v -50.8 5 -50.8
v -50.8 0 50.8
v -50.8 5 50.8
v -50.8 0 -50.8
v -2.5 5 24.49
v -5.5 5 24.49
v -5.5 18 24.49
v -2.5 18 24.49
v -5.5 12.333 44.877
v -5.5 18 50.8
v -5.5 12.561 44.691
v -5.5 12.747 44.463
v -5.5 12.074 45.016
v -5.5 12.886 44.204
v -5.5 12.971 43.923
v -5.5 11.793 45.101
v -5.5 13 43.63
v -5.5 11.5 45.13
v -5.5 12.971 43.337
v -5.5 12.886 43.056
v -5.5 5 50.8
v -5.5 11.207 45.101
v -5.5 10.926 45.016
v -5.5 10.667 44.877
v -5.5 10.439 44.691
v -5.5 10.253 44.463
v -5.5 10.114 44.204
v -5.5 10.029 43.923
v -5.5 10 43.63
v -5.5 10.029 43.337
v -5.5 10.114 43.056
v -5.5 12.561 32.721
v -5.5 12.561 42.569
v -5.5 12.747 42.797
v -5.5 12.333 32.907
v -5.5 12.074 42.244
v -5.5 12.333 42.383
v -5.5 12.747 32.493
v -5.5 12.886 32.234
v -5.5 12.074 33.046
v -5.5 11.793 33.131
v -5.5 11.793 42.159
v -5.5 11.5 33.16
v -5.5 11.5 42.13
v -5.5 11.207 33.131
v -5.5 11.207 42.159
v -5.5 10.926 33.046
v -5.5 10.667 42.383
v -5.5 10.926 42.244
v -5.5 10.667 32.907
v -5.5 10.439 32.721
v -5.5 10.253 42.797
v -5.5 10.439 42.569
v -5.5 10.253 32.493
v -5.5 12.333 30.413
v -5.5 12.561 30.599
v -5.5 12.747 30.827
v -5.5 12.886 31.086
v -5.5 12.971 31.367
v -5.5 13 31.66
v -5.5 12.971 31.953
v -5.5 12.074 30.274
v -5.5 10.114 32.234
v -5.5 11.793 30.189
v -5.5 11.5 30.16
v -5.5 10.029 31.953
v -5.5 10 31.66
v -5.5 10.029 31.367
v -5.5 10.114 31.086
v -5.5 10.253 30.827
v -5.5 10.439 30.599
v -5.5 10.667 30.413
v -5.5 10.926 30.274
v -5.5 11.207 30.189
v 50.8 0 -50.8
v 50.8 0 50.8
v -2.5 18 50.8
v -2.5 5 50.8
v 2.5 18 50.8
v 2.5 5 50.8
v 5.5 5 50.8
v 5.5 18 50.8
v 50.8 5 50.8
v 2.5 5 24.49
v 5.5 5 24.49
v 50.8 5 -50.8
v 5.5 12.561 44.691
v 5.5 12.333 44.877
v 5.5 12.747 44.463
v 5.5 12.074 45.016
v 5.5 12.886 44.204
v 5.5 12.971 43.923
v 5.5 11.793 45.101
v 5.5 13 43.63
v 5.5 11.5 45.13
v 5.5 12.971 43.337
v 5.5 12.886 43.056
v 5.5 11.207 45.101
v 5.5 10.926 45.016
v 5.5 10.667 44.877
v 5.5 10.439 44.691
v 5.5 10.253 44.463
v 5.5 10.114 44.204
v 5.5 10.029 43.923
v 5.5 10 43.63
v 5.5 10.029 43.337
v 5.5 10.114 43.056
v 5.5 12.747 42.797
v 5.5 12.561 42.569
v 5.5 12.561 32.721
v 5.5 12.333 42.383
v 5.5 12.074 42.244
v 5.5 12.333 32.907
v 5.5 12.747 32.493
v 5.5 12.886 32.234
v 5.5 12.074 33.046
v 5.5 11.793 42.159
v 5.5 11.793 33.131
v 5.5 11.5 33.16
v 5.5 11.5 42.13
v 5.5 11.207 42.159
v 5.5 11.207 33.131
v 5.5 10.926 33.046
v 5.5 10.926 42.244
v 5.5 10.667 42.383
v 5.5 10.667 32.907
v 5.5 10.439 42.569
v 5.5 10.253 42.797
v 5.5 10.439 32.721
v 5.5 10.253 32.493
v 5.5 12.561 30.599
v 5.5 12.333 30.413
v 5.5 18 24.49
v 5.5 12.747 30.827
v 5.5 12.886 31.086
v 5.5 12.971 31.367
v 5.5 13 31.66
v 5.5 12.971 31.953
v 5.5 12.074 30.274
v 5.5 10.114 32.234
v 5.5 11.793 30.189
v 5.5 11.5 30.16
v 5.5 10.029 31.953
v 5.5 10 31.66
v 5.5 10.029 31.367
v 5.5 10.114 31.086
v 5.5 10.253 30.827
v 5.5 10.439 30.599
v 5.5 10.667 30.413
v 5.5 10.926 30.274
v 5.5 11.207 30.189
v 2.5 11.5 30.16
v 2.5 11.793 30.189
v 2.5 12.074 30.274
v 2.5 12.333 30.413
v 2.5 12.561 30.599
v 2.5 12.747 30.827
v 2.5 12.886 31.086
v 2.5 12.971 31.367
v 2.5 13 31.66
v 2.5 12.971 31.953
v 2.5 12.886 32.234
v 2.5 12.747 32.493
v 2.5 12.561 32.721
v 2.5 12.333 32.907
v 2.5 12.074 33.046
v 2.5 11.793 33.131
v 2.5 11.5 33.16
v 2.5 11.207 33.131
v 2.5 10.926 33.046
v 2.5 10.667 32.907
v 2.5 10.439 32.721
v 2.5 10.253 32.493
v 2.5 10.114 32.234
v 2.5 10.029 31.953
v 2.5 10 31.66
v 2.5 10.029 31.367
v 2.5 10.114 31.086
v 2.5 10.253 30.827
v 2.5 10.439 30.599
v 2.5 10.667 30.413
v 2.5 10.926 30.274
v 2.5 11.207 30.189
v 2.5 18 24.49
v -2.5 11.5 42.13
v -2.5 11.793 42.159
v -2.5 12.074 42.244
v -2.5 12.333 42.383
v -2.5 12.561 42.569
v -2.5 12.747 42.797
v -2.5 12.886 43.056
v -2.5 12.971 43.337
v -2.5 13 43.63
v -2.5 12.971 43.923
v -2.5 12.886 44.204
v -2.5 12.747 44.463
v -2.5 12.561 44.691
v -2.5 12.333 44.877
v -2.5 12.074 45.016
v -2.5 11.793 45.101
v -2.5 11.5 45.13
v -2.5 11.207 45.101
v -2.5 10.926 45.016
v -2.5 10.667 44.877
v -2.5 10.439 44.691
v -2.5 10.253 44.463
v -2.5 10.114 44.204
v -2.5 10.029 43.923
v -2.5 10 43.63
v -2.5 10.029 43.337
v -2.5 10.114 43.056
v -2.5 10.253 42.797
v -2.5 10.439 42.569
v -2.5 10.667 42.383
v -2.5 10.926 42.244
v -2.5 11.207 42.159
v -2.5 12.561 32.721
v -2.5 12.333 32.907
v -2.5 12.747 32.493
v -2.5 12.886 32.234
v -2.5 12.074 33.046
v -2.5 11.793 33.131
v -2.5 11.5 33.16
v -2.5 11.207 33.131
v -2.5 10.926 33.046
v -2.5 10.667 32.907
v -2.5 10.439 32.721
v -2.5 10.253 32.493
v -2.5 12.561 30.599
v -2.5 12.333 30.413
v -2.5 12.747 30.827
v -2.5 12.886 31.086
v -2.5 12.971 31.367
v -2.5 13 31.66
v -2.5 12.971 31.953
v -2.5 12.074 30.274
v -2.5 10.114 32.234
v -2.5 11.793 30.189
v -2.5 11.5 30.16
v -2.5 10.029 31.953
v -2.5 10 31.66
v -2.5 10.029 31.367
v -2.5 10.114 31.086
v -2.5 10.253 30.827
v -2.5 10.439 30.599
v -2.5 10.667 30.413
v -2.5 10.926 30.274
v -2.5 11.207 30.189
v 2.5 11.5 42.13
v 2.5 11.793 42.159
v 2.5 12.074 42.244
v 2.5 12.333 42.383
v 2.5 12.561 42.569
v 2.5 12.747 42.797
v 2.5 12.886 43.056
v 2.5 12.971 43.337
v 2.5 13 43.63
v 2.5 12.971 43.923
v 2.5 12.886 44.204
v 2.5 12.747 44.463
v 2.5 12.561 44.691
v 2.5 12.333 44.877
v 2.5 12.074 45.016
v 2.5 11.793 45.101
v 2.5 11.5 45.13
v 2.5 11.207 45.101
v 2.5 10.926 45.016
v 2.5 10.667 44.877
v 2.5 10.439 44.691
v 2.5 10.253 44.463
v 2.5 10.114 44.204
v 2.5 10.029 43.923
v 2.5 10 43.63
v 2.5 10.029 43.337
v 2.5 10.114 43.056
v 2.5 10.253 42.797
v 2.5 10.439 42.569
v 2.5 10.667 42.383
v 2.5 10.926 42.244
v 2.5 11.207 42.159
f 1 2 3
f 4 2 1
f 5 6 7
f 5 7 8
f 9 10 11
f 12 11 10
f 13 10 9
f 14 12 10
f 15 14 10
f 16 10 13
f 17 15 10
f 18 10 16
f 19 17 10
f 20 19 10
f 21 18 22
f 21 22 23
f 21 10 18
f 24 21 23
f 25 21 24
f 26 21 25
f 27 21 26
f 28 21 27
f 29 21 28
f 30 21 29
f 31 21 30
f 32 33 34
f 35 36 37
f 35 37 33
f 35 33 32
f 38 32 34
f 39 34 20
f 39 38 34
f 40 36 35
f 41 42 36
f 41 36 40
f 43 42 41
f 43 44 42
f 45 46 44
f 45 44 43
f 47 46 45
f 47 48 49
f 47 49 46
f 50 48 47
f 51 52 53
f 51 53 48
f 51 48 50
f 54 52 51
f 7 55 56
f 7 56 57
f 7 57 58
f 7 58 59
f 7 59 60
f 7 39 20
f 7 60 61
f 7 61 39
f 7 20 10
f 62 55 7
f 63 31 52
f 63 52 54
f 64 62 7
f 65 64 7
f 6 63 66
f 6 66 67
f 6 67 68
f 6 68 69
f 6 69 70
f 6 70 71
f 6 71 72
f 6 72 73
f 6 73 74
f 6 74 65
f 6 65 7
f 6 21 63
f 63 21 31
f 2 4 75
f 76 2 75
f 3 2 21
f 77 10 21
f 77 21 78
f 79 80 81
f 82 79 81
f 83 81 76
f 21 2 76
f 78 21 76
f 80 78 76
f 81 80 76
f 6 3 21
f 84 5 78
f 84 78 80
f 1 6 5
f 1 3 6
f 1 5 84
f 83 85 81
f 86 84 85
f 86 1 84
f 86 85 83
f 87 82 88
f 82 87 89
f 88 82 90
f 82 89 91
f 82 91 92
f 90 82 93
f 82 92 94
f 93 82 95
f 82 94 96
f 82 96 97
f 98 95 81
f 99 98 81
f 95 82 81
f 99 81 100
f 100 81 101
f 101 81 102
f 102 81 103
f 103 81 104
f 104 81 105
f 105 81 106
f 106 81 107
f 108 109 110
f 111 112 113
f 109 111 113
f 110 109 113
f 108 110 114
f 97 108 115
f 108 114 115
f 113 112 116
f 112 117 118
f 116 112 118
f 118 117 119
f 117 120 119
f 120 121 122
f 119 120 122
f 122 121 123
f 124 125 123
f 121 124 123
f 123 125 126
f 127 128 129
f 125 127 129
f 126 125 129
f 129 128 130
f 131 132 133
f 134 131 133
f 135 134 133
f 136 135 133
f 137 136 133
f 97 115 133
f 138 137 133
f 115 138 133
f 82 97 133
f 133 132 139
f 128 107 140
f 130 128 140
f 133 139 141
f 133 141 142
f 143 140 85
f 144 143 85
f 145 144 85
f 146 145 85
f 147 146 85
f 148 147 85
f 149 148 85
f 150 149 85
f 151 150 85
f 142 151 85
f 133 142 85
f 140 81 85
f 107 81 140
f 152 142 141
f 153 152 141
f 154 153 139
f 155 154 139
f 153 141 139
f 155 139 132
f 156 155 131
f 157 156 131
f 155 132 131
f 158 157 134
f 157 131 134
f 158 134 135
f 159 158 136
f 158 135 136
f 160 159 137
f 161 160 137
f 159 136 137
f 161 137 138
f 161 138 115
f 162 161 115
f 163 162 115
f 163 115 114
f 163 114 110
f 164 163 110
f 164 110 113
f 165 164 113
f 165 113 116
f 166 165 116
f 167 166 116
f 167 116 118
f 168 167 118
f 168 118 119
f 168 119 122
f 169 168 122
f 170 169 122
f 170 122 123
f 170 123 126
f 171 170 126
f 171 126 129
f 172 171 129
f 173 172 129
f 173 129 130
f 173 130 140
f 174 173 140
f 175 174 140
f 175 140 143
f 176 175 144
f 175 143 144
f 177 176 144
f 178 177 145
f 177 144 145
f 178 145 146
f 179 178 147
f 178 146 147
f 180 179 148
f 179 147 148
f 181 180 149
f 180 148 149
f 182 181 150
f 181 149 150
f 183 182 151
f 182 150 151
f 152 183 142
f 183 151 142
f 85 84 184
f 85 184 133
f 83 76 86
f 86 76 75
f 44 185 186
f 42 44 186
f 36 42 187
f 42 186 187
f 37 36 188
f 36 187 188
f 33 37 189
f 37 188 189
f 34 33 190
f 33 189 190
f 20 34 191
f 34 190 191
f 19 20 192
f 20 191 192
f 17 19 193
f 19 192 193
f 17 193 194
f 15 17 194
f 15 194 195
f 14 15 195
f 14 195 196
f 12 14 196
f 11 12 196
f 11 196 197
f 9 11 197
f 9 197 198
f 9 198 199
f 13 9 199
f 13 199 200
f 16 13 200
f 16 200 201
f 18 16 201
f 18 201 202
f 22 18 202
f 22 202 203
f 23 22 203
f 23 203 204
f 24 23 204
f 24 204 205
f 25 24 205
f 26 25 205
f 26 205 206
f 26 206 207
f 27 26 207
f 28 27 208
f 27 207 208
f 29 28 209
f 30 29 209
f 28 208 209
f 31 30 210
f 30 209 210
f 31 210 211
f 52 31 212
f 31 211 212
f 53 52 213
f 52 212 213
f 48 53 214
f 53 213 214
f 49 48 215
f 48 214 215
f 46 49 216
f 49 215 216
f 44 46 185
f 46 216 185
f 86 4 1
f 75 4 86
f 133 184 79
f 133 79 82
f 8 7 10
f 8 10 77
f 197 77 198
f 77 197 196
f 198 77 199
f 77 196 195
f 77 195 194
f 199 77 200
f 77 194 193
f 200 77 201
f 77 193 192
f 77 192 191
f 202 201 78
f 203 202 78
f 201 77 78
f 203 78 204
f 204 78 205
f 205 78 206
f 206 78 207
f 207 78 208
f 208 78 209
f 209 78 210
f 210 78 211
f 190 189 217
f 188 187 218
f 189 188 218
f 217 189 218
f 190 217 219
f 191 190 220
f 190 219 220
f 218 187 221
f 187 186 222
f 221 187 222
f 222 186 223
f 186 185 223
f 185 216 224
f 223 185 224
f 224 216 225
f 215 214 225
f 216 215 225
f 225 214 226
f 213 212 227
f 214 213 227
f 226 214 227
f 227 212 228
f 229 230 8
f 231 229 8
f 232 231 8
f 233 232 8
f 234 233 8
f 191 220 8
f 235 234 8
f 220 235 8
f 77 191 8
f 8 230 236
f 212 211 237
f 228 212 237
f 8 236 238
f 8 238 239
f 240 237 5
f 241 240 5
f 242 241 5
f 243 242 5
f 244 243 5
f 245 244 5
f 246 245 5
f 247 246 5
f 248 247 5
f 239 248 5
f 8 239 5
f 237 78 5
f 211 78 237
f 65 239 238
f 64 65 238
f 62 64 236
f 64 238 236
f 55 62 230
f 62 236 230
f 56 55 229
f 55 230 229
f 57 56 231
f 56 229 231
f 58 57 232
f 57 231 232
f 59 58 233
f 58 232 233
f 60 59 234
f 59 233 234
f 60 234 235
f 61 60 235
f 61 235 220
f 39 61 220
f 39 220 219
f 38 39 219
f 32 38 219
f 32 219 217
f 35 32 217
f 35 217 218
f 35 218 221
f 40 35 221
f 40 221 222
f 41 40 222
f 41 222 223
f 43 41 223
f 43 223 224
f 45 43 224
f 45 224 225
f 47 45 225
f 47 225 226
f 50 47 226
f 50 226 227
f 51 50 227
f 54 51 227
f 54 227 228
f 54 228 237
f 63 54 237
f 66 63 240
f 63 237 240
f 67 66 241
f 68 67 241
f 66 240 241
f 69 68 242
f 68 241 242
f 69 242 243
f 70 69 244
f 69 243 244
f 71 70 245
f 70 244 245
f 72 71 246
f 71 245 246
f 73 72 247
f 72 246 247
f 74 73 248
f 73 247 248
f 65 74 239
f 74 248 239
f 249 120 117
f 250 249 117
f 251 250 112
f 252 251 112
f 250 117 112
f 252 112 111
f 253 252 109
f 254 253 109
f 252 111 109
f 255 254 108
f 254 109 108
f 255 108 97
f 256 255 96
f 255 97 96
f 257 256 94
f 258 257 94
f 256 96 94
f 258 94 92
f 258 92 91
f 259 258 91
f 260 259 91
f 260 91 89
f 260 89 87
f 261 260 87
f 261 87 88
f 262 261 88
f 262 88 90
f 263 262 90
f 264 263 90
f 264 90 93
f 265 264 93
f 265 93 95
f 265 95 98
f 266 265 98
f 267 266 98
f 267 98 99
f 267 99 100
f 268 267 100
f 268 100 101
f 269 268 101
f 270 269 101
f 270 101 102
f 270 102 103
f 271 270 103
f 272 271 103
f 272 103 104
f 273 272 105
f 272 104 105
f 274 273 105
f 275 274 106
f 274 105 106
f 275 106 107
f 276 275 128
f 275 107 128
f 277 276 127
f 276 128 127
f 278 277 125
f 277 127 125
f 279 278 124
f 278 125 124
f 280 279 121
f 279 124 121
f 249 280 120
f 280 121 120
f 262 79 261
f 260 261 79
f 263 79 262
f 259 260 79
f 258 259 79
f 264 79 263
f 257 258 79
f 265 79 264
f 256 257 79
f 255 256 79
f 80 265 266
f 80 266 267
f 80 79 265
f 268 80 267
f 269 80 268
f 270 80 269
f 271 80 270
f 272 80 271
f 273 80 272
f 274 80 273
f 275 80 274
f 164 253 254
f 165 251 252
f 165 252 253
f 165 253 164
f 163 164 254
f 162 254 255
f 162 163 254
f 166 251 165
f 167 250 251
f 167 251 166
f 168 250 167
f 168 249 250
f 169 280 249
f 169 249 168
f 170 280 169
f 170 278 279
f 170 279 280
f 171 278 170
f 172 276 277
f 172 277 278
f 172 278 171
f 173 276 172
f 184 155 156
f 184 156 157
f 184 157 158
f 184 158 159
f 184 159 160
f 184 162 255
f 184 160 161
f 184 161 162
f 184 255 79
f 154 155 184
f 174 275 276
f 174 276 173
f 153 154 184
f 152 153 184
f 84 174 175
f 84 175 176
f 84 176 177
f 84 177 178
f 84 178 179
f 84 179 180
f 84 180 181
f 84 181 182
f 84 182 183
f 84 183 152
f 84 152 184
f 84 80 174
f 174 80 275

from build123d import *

# Parameters (mm, degrees)
SKETCH1_W           = 101.6
SKETCH1_H           = 101.6
BOSS_EXTRUDE1_DEPTH = 5
SKETCH2_W           = 3
SKETCH2_H           = 26.31
BOSS_EXTRUDE2_DEPTH = 13
SKETCH3_R           = 1.5
CUT_EXTRUDE1_DEPTH  = 13


with BuildPart() as part:
    # Sketch1 → Boss-Extrude1 (new body)
    with BuildSketch(Plane(origin=(0, 0, 0), x_dir=(1, 0, 0), z_dir=(0, 1, 0))):
        Rectangle(SKETCH1_W, SKETCH1_H)
    extrude(amount=BOSS_EXTRUDE1_DEPTH)

    # Sketch2 → Boss-Extrude2 (add)
    with BuildSketch(Plane(origin=(0, 5, 0), x_dir=(1, 0, 0), z_dir=(0, 1, 0))):
        with Locations((-4, -37.645)):
            Rectangle(SKETCH2_W, SKETCH2_H)
        with Locations((4, -37.645)):
            Rectangle(SKETCH2_W, SKETCH2_H)
    extrude(amount=BOSS_EXTRUDE2_DEPTH)

    # Sketch3 → Cut-Extrude1 (cut)
    with BuildSketch(Plane(origin=(5.5, 0, 0), x_dir=(0, 0, -1), z_dir=(1, 0, 0))):
        with Locations((-43.63, 11.5)):
            Circle(SKETCH3_R)
        with Locations((-31.66, 11.5)):
            Circle(SKETCH3_R)
    extrude(amount=-CUT_EXTRUDE1_DEPTH, mode=Mode.SUBTRACT)


solid = part.part
